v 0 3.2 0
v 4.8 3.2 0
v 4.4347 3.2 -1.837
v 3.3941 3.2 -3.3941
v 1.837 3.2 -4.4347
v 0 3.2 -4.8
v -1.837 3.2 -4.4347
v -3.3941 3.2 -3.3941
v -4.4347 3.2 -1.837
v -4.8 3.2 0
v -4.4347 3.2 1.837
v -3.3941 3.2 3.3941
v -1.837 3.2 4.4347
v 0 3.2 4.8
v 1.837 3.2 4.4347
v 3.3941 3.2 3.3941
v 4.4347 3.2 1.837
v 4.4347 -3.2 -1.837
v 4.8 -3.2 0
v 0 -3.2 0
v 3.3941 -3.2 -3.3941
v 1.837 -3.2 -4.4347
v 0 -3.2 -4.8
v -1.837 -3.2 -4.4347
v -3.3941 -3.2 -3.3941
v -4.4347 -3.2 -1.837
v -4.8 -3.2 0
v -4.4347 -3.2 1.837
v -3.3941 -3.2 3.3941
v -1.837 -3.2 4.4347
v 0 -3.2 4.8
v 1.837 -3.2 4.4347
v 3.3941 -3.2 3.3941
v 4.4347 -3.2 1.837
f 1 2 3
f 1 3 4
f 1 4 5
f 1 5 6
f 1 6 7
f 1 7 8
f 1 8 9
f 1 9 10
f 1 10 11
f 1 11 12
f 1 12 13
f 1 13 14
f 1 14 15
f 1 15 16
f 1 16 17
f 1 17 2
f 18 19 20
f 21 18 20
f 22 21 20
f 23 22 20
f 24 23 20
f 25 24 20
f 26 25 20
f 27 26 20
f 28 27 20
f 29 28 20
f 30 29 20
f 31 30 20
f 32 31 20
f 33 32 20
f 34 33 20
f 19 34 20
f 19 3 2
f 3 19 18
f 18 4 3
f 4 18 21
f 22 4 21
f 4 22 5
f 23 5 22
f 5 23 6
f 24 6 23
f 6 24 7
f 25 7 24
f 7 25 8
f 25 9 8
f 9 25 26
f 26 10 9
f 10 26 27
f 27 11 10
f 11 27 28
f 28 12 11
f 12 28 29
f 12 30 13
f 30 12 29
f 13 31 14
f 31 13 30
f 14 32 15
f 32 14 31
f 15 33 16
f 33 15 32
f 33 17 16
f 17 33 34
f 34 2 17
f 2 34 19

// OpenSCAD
// file: ../p/4-4edge.scad
use <../lib.scad>
function ldraw_lib__4_4edge() = [
// 0 Circle 1.0
// 0 Name: 4-4edge.dat
// 0 Author: James Jessiman
// 0 !LDRAW_ORG Primitive UPDATE 2017-01
// 0 !LICENSE Licensed under CC BY 2.0 and CC BY 4.0 : see CAreadme.txt
// 
// 0 BFC CERTIFY CCW
  [0,"BFC","CERTIFY"],
  [0,"BFC","CCW"],
// 
// 0 !HISTORY 1998-12-15 [PTadmin] Official Update 1998-10
// 0 !HISTORY 2005-12-28 [PTadmin] Official Update 2005-01
// 0 !HISTORY 2007-06-24 [PTadmin] Header formatted for Contributor Agreement
// 0 !HISTORY 2008-07-01 [PTadmin] Official Update 2008-01
// 0 !HISTORY 2017-01-15 [Steffen] BFCed
// 0 !HISTORY 2017-12-30 [PTadmin] Official Update 2017-01
// 
// 
// 2 24 1 0 0 0.9239 0 0.3827
  [2,24,1,0,0,0.9239,0,0.3827],
// 2 24 0.9239 0 0.3827 0.7071 0 0.7071
  [2,24,0.9239,0,0.3827,0.7071,0,0.7071],
// 2 24 0.7071 0 0.7071 0.3827 0 0.9239
  [2,24,0.7071,0,0.7071,0.3827,0,0.9239],
// 2 24 0.3827 0 0.9239 0 0 1
  [2,24,0.3827,0,0.9239,0,0,1],
// 2 24 0 0 1 -0.3827 0 0.9239
  [2,24,0,0,1,-0.3827,0,0.9239],
// 2 24 -0.3827 0 0.9239 -0.7071 0 0.7071
  [2,24,-0.3827,0,0.9239,-0.7071,0,0.7071],
// 2 24 -0.7071 0 0.7071 -0.9239 0 0.3827
  [2,24,-0.7071,0,0.7071,-0.9239,0,0.3827],
// 2 24 -0.9239 0 0.3827 -1 0 -0
  [2,24,-0.9239,0,0.3827,-1,0,-0],
// 2 24 -1 0 -0 -0.9239 0 -0.3827
  [2,24,-1,0,-0,-0.9239,0,-0.3827],
// 2 24 -0.9239 0 -0.3827 -0.7071 0 -0.7071
  [2,24,-0.9239,0,-0.3827,-0.7071,0,-0.7071],
// 2 24 -0.7071 0 -0.7071 -0.3827 0 -0.9239
  [2,24,-0.7071,0,-0.7071,-0.3827,0,-0.9239],
// 2 24 -0.3827 0 -0.9239 0 0 -1
  [2,24,-0.3827,0,-0.9239,0,0,-1],
// 2 24 0 0 -1 0.3827 0 -0.9239
  [2,24,0,0,-1,0.3827,0,-0.9239],
// 2 24 0.3827 0 -0.9239 0.7071 0 -0.7071
  [2,24,0.3827,0,-0.9239,0.7071,0,-0.7071],
// 2 24 0.7071 0 -0.7071 0.9239 0 -0.3827
  [2,24,0.7071,0,-0.7071,0.9239,0,-0.3827],
// 2 24 0.9239 0 -0.3827 1 0 0
  [2,24,0.9239,0,-0.3827,1,0,0],
];
makepoly(ldraw_lib__4_4edge(), line=0.2);
// file: ../p/4-4disc.scad
use <../lib.scad>
function ldraw_lib__4_4disc() = [
// 0 Disc 1.0
// 0 Name: 4-4disc.dat
// 0 Author: James Jessiman
// 0 !LDRAW_ORG Primitive UPDATE 2002-02
// 0 !LICENSE Licensed under CC BY 2.0 and CC BY 4.0 : see CAreadme.txt
// 
// 0 BFC CERTIFY CCW
  [0,"BFC","CERTIFY"],
  [0,"BFC","CCW"],
// 
// 0 !HISTORY 1998-12-15 [PTadmin] Official Update 1998-10
// 0 !HISTORY 2002-03-23 [sbliss] Added BFC statement
// 0 !HISTORY 2002-04-25 [PTadmin] Official Update 2002-02
// 0 !HISTORY 2007-06-24 [PTadmin] Header formatted for Contributor Agreement
// 0 !HISTORY 2008-07-01 [PTadmin] Official Update 2008-01
// 
// 
// 3 16 0 0 0 1 0 0 0.9239 0 0.3827
  [3,16,0,0,0,1,0,0,0.9239,0,0.3827],
// 3 16 0 0 0 0.9239 0 0.3827 0.7071 0 0.7071
  [3,16,0,0,0,0.9239,0,0.3827,0.7071,0,0.7071],
// 3 16 0 0 0 0.7071 0 0.7071 0.3827 0 0.9239
  [3,16,0,0,0,0.7071,0,0.7071,0.3827,0,0.9239],
// 3 16 0 0 0 0.3827 0 0.9239 0 0 1
  [3,16,0,0,0,0.3827,0,0.9239,0,0,1],
// 3 16 0 0 0 0 0 1 -0.3827 0 0.9239
  [3,16,0,0,0,0,0,1,-0.3827,0,0.9239],
// 3 16 0 0 0 -0.3827 0 0.9239 -0.7071 0 0.7071
  [3,16,0,0,0,-0.3827,0,0.9239,-0.7071,0,0.7071],
// 3 16 0 0 0 -0.7071 0 0.7071 -0.9239 0 0.3827
  [3,16,0,0,0,-0.7071,0,0.7071,-0.9239,0,0.3827],
// 3 16 0 0 0 -0.9239 0 0.3827 -1 0 -0
  [3,16,0,0,0,-0.9239,0,0.3827,-1,0,-0],
// 3 16 0 0 0 -1 0 -0 -0.9239 0 -0.3827
  [3,16,0,0,0,-1,0,-0,-0.9239,0,-0.3827],
// 3 16 0 0 0 -0.9239 0 -0.3827 -0.7071 0 -0.7071
  [3,16,0,0,0,-0.9239,0,-0.3827,-0.7071,0,-0.7071],
// 3 16 0 0 0 -0.7071 0 -0.7071 -0.3827 0 -0.9239
  [3,16,0,0,0,-0.7071,0,-0.7071,-0.3827,0,-0.9239],
// 3 16 0 0 0 -0.3827 0 -0.9239 0 0 -1
  [3,16,0,0,0,-0.3827,0,-0.9239,0,0,-1],
// 3 16 0 0 0 0 0 -1 0.3827 0 -0.9239
  [3,16,0,0,0,0,0,-1,0.3827,0,-0.9239],
// 3 16 0 0 0 0.3827 0 -0.9239 0.7071 0 -0.7071
  [3,16,0,0,0,0.3827,0,-0.9239,0.7071,0,-0.7071],
// 3 16 0 0 0 0.7071 0 -0.7071 0.9239 0 -0.3827
  [3,16,0,0,0,0.7071,0,-0.7071,0.9239,0,-0.3827],
// 3 16 0 0 0 0.9239 0 -0.3827 1 0 0
  [3,16,0,0,0,0.9239,0,-0.3827,1,0,0],
// 0
];
makepoly(ldraw_lib__4_4disc(), line=0.2);
// file: ../p/4-4cyli.scad
use <../lib.scad>
function ldraw_lib__4_4cyli() = [
// 0 Cylinder 1.0
// 0 Name: 4-4cyli.dat
// 0 Author: James Jessiman
// 0 !LDRAW_ORG Primitive UPDATE 2005-01
// 0 !LICENSE Licensed under CC BY 2.0 and CC BY 4.0 : see CAreadme.txt
// 
// 0 BFC CERTIFY CCW
  [0,"BFC","CERTIFY"],
  [0,"BFC","CCW"],
// 
// 0 !HISTORY 1998-12-15 [PTadmin] Official Update 1998-10
// 0 !HISTORY 2002-03-23 [sbliss] Added BFC statement; merged headers from files in distributions LDraw 0.27 and Complete.
// 0 !HISTORY 2002-04-25 [PTadmin] Official Update 2002-02
// 0 !HISTORY 2004-12-14 [guyvivan] BFC CCW
// 0 !HISTORY 2005-12-28 [PTadmin] Official Update 2005-01
// 0 !HISTORY 2007-06-24 [PTadmin] Header formatted for Contributor Agreement
// 0 !HISTORY 2008-07-01 [PTadmin] Official Update 2008-01
// 
// 
// 4 16 1 1 0 0.9239 1 0.3827 0.9239 0 0.3827 1 0 0
  [4,16,1,1,0,0.9239,1,0.3827,0.9239,0,0.3827,1,0,0],
// 5 24 1 0 0 1 1 0 0.9239 0 0.3827 0.9239 0 -0.3827
  [5,24,1,0,0,1,1,0,0.9239,0,0.3827,0.9239,0,-0.3827],
// 4 16 0.9239 1 0.3827 0.7071 1 0.7071 0.7071 0 0.7071 0.9239 0 0.3827
  [4,16,0.9239,1,0.3827,0.7071,1,0.7071,0.7071,0,0.7071,0.9239,0,0.3827],
// 5 24 0.9239 0 0.3827 0.9239 1 0.3827 0.7071 0 0.7071 1 0 0
  [5,24,0.9239,0,0.3827,0.9239,1,0.3827,0.7071,0,0.7071,1,0,0],
// 4 16 0.7071 1 0.7071 0.3827 1 0.9239 0.3827 0 0.9239 0.7071 0 0.7071
  [4,16,0.7071,1,0.7071,0.3827,1,0.9239,0.3827,0,0.9239,0.7071,0,0.7071],
// 5 24 0.7071 0 0.7071 0.7071 1 0.7071 0.3827 0 0.9239 0.9239 0 0.3827
  [5,24,0.7071,0,0.7071,0.7071,1,0.7071,0.3827,0,0.9239,0.9239,0,0.3827],
// 4 16 0.3827 1 0.9239 0 1 1 0 0 1 0.3827 0 0.9239
  [4,16,0.3827,1,0.9239,0,1,1,0,0,1,0.3827,0,0.9239],
// 5 24 0.3827 0 0.9239 0.3827 1 0.9239 0 0 1 0.7071 0 0.7071
  [5,24,0.3827,0,0.9239,0.3827,1,0.9239,0,0,1,0.7071,0,0.7071],
// 4 16 0 1 1 -0.3827 1 0.9239 -0.3827 0 0.9239 0 0 1
  [4,16,0,1,1,-0.3827,1,0.9239,-0.3827,0,0.9239,0,0,1],
// 5 24 0 0 1 0 1 1 -0.3827 0 0.9239 0.3827 0 0.9239
  [5,24,0,0,1,0,1,1,-0.3827,0,0.9239,0.3827,0,0.9239],
// 4 16 -0.3827 1 0.9239 -0.7071 1 0.7071 -0.7071 0 0.7071 -0.3827 0 0.9239
  [4,16,-0.3827,1,0.9239,-0.7071,1,0.7071,-0.7071,0,0.7071,-0.3827,0,0.9239],
// 5 24 -0.3827 0 0.9239 -0.3827 1 0.9239 -0.7071 0 0.7071 0 0 1
  [5,24,-0.3827,0,0.9239,-0.3827,1,0.9239,-0.7071,0,0.7071,0,0,1],
// 4 16 -0.7071 1 0.7071 -0.9239 1 0.3827 -0.9239 0 0.3827 -0.7071 0 0.7071
  [4,16,-0.7071,1,0.7071,-0.9239,1,0.3827,-0.9239,0,0.3827,-0.7071,0,0.7071],
// 5 24 -0.7071 0 0.7071 -0.7071 1 0.7071 -0.9239 0 0.3827 -0.3827 0 0.9239
  [5,24,-0.7071,0,0.7071,-0.7071,1,0.7071,-0.9239,0,0.3827,-0.3827,0,0.9239],
// 4 16 -0.9239 1 0.3827 -1 1 0 -1 0 0 -0.9239 0 0.3827
  [4,16,-0.9239,1,0.3827,-1,1,0,-1,0,0,-0.9239,0,0.3827],
// 5 24 -0.9239 0 0.3827 -0.9239 1 0.3827 -1 0 0 -0.7071 0 0.7071
  [5,24,-0.9239,0,0.3827,-0.9239,1,0.3827,-1,0,0,-0.7071,0,0.7071],
// 4 16 -1 1 0 -0.9239 1 -0.3827 -0.9239 0 -0.3827 -1 0 0
  [4,16,-1,1,0,-0.9239,1,-0.3827,-0.9239,0,-0.3827,-1,0,0],
// 5 24 -1 0 0 -1 1 0 -0.9239 0 -0.3827 -0.9239 0 0.3827
  [5,24,-1,0,0,-1,1,0,-0.9239,0,-0.3827,-0.9239,0,0.3827],
// 4 16 -0.9239 1 -0.3827 -0.7071 1 -0.7071 -0.7071 0 -0.7071 -0.9239 0 -0.3827
  [4,16,-0.9239,1,-0.3827,-0.7071,1,-0.7071,-0.7071,0,-0.7071,-0.9239,0,-0.3827],
// 5 24 -0.9239 0 -0.3827 -0.9239 1 -0.3827 -0.7071 0 -0.7071 -1 0 0
  [5,24,-0.9239,0,-0.3827,-0.9239,1,-0.3827,-0.7071,0,-0.7071,-1,0,0],
// 4 16 -0.7071 1 -0.7071 -0.3827 1 -0.9239 -0.3827 0 -0.9239 -0.7071 0 -0.7071
  [4,16,-0.7071,1,-0.7071,-0.3827,1,-0.9239,-0.3827,0,-0.9239,-0.7071,0,-0.7071],
// 5 24 -0.7071 0 -0.7071 -0.7071 1 -0.7071 -0.3827 0 -0.9239 -0.9239 0 -0.3827
  [5,24,-0.7071,0,-0.7071,-0.7071,1,-0.7071,-0.3827,0,-0.9239,-0.9239,0,-0.3827],
// 4 16 -0.3827 1 -0.9239 0 1 -1 0 0 -1 -0.3827 0 -0.9239
  [4,16,-0.3827,1,-0.9239,0,1,-1,0,0,-1,-0.3827,0,-0.9239],
// 5 24 -0.3827 0 -0.9239 -0.3827 1 -0.9239 0 0 -1 -0.7071 0 -0.7071
  [5,24,-0.3827,0,-0.9239,-0.3827,1,-0.9239,0,0,-1,-0.7071,0,-0.7071],
// 4 16 0 1 -1 0.3827 1 -0.9239 0.3827 0 -0.9239 0 0 -1
  [4,16,0,1,-1,0.3827,1,-0.9239,0.3827,0,-0.9239,0,0,-1],
// 5 24 0 0 -1 0 1 -1 0.3827 0 -0.9239 -0.3827 0 -0.9239
  [5,24,0,0,-1,0,1,-1,0.3827,0,-0.9239,-0.3827,0,-0.9239],
// 4 16 0.3827 1 -0.9239 0.7071 1 -0.7071 0.7071 0 -0.7071 0.3827 0 -0.9239
  [4,16,0.3827,1,-0.9239,0.7071,1,-0.7071,0.7071,0,-0.7071,0.3827,0,-0.9239],
// 5 24 0.3827 0 -0.9239 0.3827 1 -0.9239 0.7071 0 -0.7071 0 0 -1
  [5,24,0.3827,0,-0.9239,0.3827,1,-0.9239,0.7071,0,-0.7071,0,0,-1],
// 4 16 0.7071 1 -0.7071 0.9239 1 -0.3827 0.9239 0 -0.3827 0.7071 0 -0.7071
  [4,16,0.7071,1,-0.7071,0.9239,1,-0.3827,0.9239,0,-0.3827,0.7071,0,-0.7071],
// 5 24 0.7071 0 -0.7071 0.7071 1 -0.7071 0.9239 0 -0.3827 0.3827 0 -0.9239
  [5,24,0.7071,0,-0.7071,0.7071,1,-0.7071,0.9239,0,-0.3827,0.3827,0,-0.9239],
// 4 16 0.9239 1 -0.3827 1 1 0 1 0 0 0.9239 0 -0.3827
  [4,16,0.9239,1,-0.3827,1,1,0,1,0,0,0.9239,0,-0.3827],
// 5 24 0.9239 0 -0.3827 0.9239 1 -0.3827 1 0 0 0.7071 0 -0.7071
  [5,24,0.9239,0,-0.3827,0.9239,1,-0.3827,1,0,0,0.7071,0,-0.7071],
// 0
];
makepoly(ldraw_lib__4_4cyli(), line=0.2);
// main file
use <../lib.scad>
use <../p/4-4cyli.scad>
use <../p/4-4disc.scad>
use <../p/4-4edge.scad>
function ldraw_lib__70023() = [
// 0 ~Magnet Cylindrical
// 0 Name: 70023.dat
// 0 Author: Chris Dee [cwdee]
// 0 !LDRAW_ORG Part UPDATE 2012-03
// 0 !LICENSE Licensed under CC BY 2.0 and CC BY 4.0 : see CAreadme.txt
// 
// 0 BFC CERTIFY CW
  [0,"BFC","CERTIFY"],
  [0,"BFC","CW"],
// 
// 0 !HISTORY 2010-07-05 [PTadmin] Official Update 2010-02
// 0 !HISTORY 2012-08-11 [Steffen] Add ~ to title
// 0 !HISTORY 2012-12-28 [PTadmin] Official Update 2012-03
// 
// 
// 1 16 0 0 8 12 0 0 0 0 12 0 -1 0 4-4disc.dat
  [1,16,0,0,8,12,0,0,0,0,12,0,-1,0, ldraw_lib__4_4disc()],
// 1 16 0 0 -8 12 0 0 0 0 12 0 1 0 4-4disc.dat
  [1,16,0,0,-8,12,0,0,0,0,12,0,1,0, ldraw_lib__4_4disc()],
// 1 16 0 0 8 12 0 0 0 0 12 0 -1 0 4-4edge.dat
  [1,16,0,0,8,12,0,0,0,0,12,0,-1,0, ldraw_lib__4_4edge()],
// 1 16 0 0 -8 12 0 0 0 0 12 0 1 0 4-4edge.dat
  [1,16,0,0,-8,12,0,0,0,0,12,0,1,0, ldraw_lib__4_4edge()],
// 1 16 0 0 -8 12 0 0 0 0 12 0 16 0 4-4cyli.dat
  [1,16,0,0,-8,12,0,0,0,0,12,0,16,0, ldraw_lib__4_4cyli()],
];
makepoly(ldraw_lib__70023(), line=0.2);
